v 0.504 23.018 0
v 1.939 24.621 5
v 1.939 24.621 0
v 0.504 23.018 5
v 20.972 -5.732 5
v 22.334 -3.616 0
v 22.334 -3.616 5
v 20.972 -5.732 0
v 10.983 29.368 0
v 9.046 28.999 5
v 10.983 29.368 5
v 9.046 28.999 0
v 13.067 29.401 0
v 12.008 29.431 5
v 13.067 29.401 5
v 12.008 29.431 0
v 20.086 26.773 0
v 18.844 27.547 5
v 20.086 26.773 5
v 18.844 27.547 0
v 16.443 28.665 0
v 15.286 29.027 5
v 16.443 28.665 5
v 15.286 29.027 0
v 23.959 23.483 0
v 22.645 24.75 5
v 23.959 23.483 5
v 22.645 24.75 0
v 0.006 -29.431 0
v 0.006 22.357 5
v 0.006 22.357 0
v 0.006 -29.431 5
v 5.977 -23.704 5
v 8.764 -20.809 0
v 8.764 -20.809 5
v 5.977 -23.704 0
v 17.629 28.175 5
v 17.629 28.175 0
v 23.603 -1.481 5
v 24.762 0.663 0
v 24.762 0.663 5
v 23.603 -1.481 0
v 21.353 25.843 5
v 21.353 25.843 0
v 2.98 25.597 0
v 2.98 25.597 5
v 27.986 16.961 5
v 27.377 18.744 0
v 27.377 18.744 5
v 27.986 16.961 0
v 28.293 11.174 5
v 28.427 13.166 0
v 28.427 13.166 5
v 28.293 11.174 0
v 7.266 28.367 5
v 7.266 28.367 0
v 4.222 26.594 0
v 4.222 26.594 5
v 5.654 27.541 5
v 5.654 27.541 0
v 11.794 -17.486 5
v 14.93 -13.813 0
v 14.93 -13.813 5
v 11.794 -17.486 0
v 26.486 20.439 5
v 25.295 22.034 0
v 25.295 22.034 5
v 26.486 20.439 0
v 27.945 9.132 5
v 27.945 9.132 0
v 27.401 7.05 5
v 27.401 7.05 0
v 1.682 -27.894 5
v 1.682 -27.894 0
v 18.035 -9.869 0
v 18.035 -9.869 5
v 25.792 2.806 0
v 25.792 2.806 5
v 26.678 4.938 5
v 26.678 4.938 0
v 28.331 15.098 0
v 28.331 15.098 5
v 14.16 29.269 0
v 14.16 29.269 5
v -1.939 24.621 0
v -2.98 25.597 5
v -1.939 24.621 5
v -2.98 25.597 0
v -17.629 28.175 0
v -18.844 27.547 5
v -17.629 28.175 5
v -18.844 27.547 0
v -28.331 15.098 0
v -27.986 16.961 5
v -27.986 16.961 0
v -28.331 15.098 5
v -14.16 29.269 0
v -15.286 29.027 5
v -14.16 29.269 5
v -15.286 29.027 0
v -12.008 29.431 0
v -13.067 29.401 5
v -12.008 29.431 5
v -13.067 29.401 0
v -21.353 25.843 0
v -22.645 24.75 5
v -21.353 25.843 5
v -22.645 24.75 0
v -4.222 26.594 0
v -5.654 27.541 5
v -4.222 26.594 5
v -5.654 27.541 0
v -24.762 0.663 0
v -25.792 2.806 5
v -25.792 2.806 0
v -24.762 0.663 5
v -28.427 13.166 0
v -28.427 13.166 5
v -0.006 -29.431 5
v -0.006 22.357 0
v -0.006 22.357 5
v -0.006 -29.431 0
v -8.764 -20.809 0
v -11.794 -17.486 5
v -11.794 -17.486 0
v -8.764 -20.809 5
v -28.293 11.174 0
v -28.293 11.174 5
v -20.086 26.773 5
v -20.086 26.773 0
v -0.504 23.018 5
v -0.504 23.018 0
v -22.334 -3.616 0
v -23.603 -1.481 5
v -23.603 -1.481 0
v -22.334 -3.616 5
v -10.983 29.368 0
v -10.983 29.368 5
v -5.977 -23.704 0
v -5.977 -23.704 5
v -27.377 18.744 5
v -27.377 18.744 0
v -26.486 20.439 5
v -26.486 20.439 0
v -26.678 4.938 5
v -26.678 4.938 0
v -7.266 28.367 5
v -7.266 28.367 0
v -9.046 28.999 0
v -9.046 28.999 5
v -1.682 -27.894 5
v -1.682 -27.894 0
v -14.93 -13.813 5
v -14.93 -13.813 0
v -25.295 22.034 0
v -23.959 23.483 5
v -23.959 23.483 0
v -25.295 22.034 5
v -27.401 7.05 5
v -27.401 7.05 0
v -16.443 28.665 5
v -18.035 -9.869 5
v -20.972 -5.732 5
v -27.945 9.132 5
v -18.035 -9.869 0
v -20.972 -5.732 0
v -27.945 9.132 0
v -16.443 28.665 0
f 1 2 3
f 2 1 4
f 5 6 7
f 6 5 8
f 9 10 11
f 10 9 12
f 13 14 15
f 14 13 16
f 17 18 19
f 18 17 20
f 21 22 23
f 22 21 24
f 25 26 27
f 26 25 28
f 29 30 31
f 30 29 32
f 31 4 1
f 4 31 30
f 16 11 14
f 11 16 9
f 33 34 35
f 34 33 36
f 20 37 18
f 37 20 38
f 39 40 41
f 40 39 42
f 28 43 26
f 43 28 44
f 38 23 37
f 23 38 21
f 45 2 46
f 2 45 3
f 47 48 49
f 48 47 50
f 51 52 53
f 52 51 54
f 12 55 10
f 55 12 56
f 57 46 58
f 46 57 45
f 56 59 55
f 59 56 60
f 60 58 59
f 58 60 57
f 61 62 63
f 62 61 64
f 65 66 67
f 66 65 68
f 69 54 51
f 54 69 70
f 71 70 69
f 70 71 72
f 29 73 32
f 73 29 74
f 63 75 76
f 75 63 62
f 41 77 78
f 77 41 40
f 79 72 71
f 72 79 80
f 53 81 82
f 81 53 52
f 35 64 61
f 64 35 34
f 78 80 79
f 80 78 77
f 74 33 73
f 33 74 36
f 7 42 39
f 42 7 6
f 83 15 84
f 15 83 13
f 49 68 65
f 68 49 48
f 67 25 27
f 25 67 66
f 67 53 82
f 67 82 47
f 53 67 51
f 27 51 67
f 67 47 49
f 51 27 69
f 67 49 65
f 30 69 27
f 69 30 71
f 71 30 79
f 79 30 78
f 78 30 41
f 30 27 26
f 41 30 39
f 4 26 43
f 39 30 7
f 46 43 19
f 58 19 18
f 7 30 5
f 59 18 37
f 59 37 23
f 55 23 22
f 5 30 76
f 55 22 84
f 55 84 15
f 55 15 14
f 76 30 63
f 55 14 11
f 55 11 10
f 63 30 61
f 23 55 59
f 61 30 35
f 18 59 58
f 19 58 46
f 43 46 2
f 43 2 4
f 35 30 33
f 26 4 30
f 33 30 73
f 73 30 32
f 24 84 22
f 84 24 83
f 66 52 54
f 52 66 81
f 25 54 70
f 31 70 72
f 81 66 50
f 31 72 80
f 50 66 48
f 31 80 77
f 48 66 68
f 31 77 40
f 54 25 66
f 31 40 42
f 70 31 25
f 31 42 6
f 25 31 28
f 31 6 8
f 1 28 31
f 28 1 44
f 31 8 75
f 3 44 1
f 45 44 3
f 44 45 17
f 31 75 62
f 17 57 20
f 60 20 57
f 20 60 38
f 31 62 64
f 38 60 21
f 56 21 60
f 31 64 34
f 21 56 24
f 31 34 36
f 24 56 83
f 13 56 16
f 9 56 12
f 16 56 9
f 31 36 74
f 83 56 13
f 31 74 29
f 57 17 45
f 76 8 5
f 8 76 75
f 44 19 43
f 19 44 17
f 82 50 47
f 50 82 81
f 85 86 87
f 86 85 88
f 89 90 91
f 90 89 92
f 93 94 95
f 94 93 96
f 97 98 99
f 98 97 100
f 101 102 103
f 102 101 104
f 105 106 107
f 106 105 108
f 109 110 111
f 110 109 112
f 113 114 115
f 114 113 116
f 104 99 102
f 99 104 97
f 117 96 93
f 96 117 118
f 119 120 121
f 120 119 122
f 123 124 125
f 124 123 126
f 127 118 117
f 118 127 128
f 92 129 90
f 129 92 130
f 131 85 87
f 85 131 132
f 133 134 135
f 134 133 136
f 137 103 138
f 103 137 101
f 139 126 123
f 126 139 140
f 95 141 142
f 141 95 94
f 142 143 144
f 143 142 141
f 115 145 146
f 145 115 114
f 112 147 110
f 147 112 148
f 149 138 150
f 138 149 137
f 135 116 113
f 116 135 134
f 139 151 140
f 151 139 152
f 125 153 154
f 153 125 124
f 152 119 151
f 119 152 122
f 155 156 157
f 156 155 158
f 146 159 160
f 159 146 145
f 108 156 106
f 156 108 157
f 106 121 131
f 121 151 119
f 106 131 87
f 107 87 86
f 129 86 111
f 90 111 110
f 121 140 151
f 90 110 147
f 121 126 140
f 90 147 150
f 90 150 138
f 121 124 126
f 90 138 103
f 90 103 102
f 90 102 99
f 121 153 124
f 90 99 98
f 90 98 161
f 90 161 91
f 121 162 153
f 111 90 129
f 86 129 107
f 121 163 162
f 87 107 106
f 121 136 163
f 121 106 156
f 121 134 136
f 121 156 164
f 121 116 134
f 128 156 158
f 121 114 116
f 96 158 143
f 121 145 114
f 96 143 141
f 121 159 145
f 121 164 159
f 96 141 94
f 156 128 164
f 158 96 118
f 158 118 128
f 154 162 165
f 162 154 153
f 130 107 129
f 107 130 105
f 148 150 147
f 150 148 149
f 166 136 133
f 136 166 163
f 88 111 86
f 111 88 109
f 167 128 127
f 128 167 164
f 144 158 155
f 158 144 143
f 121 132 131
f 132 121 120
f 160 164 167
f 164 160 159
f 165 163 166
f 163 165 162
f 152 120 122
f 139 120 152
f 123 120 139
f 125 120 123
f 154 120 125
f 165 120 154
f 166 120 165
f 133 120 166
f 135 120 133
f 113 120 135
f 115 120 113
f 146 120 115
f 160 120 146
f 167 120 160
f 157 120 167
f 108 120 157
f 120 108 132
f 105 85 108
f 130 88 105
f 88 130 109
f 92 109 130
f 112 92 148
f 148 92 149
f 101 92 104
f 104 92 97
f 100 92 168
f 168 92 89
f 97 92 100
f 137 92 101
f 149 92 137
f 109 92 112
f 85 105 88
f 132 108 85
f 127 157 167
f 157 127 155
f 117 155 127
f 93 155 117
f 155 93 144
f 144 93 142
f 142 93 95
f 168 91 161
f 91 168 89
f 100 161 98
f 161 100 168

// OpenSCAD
// Module names are of the form poly_<inkscape-path-id>().  As a result,
// you can associate a polygon in this OpenSCAD program with the corresponding
// SVG element in the Inkscape document by looking for the XML element with
// the attribute id="inkscape-path-id".

// fudge value is used to ensure that subtracted solids are a tad taller
// in the z dimension than the polygon being subtracted from.  This helps
// keep the resulting .stl file manifold.
fudge = 0.1;

module poly_path3011(h)
{
  scale([25.4/90, -25.4/90, 1]) union()
  {
    linear_extrude(height=h)
      polygon([[0.022550,-79.217324],[1.786012,-81.559752],[6.868748,-87.238296],[10.557509,-90.696390],[14.959286,-94.229849],[20.035146,-97.585784],[25.746152,-100.511306],[32.053373,-102.753527],[38.917873,-104.059558],[42.546936,-104.282476],[46.300719,-104.176512],[50.174354,-103.710058],[54.162975,-102.851500],[58.261716,-101.569229],[62.465709,-99.831634],[66.770088,-97.607103],[71.169985,-94.864025],[75.660535,-91.570789],[80.236870,-87.695784],[84.894124,-83.207400],[89.627430,-78.074024],[93.846644,-72.420811],[97.005378,-66.417155],[99.164394,-60.097808],[100.384452,-53.497520],[100.726316,-46.651042],[100.250747,-39.593127],[99.018506,-32.358524],[97.090355,-24.981986],[94.527057,-17.498264],[91.389373,-9.942108],[87.738065,-2.348270],[83.633894,5.248499],[79.137623,12.813447],[74.310013,20.311823],[63.903824,34.969857],[52.901421,48.944589],[41.788899,61.958011],[31.052352,73.732113],[21.177875,83.988884],[5.959507,98.838398],[0.022550,104.282476]]);
    linear_extrude(height=h)
      polygon([[-0.022550,-79.217324],[-1.786012,-81.559752],[-6.868748,-87.238296],[-10.557509,-90.696390],[-14.959286,-94.229849],[-20.035146,-97.585784],[-25.746153,-100.511306],[-32.053373,-102.753527],[-38.917873,-104.059558],[-42.546936,-104.282476],[-46.300719,-104.176512],[-50.174354,-103.710058],[-54.162975,-102.851500],[-58.261716,-101.569229],[-62.465709,-99.831634],[-66.770088,-97.607103],[-71.169985,-94.864025],[-75.660535,-91.570789],[-80.236870,-87.695784],[-84.894124,-83.207400],[-89.627430,-78.074024],[-93.846644,-72.420811],[-97.005378,-66.417155],[-99.164394,-60.097808],[-100.384452,-53.497520],[-100.726316,-46.651042],[-100.250747,-39.593127],[-99.018506,-32.358524],[-97.090355,-24.981986],[-94.527057,-17.498264],[-91.389373,-9.942108],[-87.738065,-2.348270],[-83.633894,5.248499],[-79.137623,12.813447],[-74.310013,20.311823],[-63.903824,34.969857],[-52.901421,48.944589],[-41.788899,61.958011],[-31.052352,73.732113],[-21.177875,83.988884],[-5.959507,98.838398],[-0.022550,104.282476]]);
  }
}

poly_path3011(5);
